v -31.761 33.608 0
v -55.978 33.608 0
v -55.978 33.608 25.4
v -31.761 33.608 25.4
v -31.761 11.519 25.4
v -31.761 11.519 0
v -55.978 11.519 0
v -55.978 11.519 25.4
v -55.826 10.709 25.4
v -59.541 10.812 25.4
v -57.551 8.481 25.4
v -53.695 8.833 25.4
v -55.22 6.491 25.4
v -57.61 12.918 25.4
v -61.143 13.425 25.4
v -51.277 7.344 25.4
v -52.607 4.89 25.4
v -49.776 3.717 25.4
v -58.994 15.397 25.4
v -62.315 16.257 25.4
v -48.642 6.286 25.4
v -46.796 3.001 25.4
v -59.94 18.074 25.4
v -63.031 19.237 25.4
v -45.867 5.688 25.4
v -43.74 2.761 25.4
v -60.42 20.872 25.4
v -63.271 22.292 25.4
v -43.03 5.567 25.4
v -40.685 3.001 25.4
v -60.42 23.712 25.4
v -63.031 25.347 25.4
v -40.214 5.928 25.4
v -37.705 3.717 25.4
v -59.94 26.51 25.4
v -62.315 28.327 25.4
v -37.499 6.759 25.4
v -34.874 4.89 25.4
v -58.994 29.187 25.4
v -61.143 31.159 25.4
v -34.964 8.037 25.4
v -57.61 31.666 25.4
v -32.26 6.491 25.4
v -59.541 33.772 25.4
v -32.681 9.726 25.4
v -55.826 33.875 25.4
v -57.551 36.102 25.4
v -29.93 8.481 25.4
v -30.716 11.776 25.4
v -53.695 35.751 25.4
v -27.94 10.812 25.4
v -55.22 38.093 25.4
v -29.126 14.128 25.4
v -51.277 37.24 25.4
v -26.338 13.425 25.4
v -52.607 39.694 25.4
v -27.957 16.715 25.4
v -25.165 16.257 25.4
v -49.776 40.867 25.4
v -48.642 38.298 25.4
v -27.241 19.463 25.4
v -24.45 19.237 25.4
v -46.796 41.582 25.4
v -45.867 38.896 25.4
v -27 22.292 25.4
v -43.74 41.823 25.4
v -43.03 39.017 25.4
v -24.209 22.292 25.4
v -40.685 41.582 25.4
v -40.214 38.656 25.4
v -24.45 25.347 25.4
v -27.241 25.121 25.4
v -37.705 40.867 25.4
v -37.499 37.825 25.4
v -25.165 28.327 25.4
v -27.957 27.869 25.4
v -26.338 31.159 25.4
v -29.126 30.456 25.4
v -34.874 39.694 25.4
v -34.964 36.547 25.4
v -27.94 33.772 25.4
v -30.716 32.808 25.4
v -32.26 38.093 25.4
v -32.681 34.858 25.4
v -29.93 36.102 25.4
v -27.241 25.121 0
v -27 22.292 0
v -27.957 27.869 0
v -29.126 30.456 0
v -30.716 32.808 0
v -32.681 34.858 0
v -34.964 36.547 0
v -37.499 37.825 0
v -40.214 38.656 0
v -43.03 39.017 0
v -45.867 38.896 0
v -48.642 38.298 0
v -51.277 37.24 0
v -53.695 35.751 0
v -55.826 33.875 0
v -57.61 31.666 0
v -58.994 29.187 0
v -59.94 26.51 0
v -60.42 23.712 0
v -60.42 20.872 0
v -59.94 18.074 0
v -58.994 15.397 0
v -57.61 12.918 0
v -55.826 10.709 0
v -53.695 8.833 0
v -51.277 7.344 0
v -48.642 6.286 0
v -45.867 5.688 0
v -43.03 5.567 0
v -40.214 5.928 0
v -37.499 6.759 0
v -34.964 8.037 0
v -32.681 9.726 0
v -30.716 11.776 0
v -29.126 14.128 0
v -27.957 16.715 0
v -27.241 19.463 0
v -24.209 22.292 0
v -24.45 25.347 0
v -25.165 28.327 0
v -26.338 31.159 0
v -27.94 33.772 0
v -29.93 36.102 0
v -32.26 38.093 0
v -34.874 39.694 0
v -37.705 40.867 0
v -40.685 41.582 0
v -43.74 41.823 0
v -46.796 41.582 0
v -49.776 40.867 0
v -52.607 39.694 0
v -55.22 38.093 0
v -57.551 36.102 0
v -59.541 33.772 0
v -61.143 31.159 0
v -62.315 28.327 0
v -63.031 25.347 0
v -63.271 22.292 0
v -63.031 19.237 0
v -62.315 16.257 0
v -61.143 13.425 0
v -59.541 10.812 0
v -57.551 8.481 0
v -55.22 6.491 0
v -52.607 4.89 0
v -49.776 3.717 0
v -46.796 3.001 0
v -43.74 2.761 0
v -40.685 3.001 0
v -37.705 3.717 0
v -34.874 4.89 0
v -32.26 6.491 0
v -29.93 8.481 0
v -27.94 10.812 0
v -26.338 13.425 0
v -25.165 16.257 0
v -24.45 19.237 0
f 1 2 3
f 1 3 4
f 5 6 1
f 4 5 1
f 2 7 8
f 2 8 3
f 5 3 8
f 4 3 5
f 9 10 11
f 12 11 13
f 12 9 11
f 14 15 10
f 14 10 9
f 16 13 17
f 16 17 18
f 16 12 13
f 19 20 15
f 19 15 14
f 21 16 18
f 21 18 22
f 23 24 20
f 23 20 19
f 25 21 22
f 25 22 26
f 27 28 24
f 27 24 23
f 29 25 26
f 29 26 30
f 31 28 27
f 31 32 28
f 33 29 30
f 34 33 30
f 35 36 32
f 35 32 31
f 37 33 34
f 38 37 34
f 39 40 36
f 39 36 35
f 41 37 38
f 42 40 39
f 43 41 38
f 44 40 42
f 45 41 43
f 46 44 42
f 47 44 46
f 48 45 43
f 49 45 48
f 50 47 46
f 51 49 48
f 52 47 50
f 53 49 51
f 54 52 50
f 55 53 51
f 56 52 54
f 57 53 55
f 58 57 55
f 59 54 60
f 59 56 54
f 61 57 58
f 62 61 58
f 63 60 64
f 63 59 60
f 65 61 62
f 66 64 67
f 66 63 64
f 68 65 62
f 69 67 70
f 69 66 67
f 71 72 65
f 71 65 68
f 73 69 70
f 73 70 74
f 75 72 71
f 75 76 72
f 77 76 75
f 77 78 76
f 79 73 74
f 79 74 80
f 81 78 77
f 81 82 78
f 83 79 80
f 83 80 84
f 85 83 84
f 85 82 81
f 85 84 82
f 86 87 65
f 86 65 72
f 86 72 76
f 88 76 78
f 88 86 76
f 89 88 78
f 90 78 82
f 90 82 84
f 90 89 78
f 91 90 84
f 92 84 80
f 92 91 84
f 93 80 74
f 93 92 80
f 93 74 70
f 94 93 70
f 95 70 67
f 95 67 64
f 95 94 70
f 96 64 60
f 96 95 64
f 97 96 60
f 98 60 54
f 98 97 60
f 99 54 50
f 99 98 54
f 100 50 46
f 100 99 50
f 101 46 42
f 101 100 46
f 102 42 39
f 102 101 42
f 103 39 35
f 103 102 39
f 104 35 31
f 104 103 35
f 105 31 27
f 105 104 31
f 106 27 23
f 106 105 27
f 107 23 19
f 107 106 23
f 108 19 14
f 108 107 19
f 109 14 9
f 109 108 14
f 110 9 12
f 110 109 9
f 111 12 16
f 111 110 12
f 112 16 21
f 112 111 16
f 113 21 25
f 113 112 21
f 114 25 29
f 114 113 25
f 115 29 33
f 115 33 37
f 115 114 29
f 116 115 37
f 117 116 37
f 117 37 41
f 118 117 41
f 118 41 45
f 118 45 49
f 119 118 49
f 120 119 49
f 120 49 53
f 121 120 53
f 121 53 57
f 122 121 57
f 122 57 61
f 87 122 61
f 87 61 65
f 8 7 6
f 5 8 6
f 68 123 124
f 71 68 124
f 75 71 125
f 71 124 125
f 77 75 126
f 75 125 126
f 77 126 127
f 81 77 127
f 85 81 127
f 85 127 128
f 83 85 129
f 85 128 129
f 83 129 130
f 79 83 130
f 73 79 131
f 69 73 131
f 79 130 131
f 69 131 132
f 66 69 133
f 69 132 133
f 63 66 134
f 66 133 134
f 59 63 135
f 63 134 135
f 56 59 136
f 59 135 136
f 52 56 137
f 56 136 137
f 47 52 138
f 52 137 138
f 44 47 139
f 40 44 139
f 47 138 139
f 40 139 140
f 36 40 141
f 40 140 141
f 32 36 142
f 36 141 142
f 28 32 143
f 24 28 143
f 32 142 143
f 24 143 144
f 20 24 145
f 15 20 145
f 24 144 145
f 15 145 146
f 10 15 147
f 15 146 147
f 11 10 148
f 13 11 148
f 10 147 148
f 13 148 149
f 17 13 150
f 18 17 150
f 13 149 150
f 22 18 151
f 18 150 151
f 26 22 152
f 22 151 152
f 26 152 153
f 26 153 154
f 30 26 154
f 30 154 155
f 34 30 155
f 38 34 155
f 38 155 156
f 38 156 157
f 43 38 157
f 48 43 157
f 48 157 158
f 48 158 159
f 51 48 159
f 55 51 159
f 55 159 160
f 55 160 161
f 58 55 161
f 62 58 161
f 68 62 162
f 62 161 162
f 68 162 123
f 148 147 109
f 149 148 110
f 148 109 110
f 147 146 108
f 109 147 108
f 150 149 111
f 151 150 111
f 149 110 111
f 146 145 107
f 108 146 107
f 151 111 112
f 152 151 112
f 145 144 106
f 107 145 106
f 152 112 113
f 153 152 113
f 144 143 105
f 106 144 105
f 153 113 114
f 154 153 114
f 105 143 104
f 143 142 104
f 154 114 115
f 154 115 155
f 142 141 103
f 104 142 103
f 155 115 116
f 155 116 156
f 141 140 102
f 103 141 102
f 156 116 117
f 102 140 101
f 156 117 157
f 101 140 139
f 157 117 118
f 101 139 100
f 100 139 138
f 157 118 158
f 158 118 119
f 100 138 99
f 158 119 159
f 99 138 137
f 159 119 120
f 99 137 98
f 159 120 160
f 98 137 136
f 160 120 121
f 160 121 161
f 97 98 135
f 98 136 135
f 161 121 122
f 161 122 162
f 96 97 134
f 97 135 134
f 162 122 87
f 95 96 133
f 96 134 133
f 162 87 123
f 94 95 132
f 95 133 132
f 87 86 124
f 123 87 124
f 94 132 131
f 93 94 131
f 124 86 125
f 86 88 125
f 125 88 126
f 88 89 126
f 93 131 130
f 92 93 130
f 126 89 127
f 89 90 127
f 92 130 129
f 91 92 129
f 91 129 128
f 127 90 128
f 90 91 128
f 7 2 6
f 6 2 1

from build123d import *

# Parameters (mm, degrees)
F0_R     = 19.530923
F0_R_2   = 16.739976
F1_DEPTH = 25.4
F2_W     = 24.21679
F2_H     = 22.088956
F3_DEPTH = 25.4


with BuildPart() as f1:
    # F0 (on Top) → F1 (new body)
    with BuildSketch(Plane.XY):
        with Locations((-43.740407, 22.291943)):
            Circle(F0_R)
        with Locations((-43.740407, 22.291943)):
            Circle(F0_R_2, mode=Mode.SUBTRACT)
    extrude(amount=F1_DEPTH)


with BuildPart() as f3:
    # F2 (on Top) → F3 (new body)
    with BuildSketch(Plane.XY):
        with Locations((-43.86949, 22.56362)):
            Rectangle(F2_W, F2_H)
    extrude(amount=F3_DEPTH)


solid = Compound([f1.part, f3.part])
